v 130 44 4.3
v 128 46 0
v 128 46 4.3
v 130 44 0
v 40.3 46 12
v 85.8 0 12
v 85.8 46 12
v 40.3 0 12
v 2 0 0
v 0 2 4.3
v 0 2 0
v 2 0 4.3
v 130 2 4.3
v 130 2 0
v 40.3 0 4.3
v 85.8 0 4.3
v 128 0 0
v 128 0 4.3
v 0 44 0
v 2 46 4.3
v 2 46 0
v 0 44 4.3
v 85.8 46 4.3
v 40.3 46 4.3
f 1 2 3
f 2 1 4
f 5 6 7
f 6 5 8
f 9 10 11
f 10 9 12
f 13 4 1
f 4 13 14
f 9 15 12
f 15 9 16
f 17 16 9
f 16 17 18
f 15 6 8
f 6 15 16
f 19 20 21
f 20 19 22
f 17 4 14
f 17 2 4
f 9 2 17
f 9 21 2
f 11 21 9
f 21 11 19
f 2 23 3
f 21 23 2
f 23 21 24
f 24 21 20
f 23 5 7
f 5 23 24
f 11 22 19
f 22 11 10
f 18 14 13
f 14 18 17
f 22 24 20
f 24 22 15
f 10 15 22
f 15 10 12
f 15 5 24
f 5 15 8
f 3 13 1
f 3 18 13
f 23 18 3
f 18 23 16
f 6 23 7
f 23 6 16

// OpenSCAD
$fn = 32;

// ----------------------------------------------------------------------
// Stepped bar: centerstep, 130 x 46 x 12/4.3 mm
// ----------------------------------------------------------------------

// --- parameters (mm) ---
bar_l = 130;              // bar length, X
bar_w = 46;               // bar width, Y
plate_t = 12;             // thickness of the thick zone, Z
thin_t = 4.3;             // thickness of the thin zone
corner_c = 2;             // corner chamfer of the bar
step_cut = 7.7;           // material removed from the thin zone
thick_from = 40.3;        // start of the thick middle zone
thick_to = 85.8;          // end of the thick middle zone
depth_1 = 7.7;            // depth of cut 1 from the top face
depth_2 = 7.7;            // depth of cut 2 from the top face

profile = [[2, 0], [128, 0], [130, 2], [130, 44], [128, 46], [2, 46], [0, 44], [0, 2]];  // primary outline, 8 points, counter clockwise
void_1 = [[-1, -1], [40.3, -1], [40.3, 47], [-1, 47]];  // thin left end, 4 points
void_2 = [[85.8, -1], [131, -1], [131, 47], [85.8, 47]];  // thin right end, 4 points

// --- the one profile operation ---
difference() {
  linear_extrude(height = plate_t) polygon(points = profile);
  translate([0, 0, plate_t - depth_1])
    linear_extrude(height = depth_1 + 1) polygon(points = void_1);
  translate([0, 0, plate_t - depth_2])
    linear_extrude(height = depth_2 + 1) polygon(points = void_2);
}
